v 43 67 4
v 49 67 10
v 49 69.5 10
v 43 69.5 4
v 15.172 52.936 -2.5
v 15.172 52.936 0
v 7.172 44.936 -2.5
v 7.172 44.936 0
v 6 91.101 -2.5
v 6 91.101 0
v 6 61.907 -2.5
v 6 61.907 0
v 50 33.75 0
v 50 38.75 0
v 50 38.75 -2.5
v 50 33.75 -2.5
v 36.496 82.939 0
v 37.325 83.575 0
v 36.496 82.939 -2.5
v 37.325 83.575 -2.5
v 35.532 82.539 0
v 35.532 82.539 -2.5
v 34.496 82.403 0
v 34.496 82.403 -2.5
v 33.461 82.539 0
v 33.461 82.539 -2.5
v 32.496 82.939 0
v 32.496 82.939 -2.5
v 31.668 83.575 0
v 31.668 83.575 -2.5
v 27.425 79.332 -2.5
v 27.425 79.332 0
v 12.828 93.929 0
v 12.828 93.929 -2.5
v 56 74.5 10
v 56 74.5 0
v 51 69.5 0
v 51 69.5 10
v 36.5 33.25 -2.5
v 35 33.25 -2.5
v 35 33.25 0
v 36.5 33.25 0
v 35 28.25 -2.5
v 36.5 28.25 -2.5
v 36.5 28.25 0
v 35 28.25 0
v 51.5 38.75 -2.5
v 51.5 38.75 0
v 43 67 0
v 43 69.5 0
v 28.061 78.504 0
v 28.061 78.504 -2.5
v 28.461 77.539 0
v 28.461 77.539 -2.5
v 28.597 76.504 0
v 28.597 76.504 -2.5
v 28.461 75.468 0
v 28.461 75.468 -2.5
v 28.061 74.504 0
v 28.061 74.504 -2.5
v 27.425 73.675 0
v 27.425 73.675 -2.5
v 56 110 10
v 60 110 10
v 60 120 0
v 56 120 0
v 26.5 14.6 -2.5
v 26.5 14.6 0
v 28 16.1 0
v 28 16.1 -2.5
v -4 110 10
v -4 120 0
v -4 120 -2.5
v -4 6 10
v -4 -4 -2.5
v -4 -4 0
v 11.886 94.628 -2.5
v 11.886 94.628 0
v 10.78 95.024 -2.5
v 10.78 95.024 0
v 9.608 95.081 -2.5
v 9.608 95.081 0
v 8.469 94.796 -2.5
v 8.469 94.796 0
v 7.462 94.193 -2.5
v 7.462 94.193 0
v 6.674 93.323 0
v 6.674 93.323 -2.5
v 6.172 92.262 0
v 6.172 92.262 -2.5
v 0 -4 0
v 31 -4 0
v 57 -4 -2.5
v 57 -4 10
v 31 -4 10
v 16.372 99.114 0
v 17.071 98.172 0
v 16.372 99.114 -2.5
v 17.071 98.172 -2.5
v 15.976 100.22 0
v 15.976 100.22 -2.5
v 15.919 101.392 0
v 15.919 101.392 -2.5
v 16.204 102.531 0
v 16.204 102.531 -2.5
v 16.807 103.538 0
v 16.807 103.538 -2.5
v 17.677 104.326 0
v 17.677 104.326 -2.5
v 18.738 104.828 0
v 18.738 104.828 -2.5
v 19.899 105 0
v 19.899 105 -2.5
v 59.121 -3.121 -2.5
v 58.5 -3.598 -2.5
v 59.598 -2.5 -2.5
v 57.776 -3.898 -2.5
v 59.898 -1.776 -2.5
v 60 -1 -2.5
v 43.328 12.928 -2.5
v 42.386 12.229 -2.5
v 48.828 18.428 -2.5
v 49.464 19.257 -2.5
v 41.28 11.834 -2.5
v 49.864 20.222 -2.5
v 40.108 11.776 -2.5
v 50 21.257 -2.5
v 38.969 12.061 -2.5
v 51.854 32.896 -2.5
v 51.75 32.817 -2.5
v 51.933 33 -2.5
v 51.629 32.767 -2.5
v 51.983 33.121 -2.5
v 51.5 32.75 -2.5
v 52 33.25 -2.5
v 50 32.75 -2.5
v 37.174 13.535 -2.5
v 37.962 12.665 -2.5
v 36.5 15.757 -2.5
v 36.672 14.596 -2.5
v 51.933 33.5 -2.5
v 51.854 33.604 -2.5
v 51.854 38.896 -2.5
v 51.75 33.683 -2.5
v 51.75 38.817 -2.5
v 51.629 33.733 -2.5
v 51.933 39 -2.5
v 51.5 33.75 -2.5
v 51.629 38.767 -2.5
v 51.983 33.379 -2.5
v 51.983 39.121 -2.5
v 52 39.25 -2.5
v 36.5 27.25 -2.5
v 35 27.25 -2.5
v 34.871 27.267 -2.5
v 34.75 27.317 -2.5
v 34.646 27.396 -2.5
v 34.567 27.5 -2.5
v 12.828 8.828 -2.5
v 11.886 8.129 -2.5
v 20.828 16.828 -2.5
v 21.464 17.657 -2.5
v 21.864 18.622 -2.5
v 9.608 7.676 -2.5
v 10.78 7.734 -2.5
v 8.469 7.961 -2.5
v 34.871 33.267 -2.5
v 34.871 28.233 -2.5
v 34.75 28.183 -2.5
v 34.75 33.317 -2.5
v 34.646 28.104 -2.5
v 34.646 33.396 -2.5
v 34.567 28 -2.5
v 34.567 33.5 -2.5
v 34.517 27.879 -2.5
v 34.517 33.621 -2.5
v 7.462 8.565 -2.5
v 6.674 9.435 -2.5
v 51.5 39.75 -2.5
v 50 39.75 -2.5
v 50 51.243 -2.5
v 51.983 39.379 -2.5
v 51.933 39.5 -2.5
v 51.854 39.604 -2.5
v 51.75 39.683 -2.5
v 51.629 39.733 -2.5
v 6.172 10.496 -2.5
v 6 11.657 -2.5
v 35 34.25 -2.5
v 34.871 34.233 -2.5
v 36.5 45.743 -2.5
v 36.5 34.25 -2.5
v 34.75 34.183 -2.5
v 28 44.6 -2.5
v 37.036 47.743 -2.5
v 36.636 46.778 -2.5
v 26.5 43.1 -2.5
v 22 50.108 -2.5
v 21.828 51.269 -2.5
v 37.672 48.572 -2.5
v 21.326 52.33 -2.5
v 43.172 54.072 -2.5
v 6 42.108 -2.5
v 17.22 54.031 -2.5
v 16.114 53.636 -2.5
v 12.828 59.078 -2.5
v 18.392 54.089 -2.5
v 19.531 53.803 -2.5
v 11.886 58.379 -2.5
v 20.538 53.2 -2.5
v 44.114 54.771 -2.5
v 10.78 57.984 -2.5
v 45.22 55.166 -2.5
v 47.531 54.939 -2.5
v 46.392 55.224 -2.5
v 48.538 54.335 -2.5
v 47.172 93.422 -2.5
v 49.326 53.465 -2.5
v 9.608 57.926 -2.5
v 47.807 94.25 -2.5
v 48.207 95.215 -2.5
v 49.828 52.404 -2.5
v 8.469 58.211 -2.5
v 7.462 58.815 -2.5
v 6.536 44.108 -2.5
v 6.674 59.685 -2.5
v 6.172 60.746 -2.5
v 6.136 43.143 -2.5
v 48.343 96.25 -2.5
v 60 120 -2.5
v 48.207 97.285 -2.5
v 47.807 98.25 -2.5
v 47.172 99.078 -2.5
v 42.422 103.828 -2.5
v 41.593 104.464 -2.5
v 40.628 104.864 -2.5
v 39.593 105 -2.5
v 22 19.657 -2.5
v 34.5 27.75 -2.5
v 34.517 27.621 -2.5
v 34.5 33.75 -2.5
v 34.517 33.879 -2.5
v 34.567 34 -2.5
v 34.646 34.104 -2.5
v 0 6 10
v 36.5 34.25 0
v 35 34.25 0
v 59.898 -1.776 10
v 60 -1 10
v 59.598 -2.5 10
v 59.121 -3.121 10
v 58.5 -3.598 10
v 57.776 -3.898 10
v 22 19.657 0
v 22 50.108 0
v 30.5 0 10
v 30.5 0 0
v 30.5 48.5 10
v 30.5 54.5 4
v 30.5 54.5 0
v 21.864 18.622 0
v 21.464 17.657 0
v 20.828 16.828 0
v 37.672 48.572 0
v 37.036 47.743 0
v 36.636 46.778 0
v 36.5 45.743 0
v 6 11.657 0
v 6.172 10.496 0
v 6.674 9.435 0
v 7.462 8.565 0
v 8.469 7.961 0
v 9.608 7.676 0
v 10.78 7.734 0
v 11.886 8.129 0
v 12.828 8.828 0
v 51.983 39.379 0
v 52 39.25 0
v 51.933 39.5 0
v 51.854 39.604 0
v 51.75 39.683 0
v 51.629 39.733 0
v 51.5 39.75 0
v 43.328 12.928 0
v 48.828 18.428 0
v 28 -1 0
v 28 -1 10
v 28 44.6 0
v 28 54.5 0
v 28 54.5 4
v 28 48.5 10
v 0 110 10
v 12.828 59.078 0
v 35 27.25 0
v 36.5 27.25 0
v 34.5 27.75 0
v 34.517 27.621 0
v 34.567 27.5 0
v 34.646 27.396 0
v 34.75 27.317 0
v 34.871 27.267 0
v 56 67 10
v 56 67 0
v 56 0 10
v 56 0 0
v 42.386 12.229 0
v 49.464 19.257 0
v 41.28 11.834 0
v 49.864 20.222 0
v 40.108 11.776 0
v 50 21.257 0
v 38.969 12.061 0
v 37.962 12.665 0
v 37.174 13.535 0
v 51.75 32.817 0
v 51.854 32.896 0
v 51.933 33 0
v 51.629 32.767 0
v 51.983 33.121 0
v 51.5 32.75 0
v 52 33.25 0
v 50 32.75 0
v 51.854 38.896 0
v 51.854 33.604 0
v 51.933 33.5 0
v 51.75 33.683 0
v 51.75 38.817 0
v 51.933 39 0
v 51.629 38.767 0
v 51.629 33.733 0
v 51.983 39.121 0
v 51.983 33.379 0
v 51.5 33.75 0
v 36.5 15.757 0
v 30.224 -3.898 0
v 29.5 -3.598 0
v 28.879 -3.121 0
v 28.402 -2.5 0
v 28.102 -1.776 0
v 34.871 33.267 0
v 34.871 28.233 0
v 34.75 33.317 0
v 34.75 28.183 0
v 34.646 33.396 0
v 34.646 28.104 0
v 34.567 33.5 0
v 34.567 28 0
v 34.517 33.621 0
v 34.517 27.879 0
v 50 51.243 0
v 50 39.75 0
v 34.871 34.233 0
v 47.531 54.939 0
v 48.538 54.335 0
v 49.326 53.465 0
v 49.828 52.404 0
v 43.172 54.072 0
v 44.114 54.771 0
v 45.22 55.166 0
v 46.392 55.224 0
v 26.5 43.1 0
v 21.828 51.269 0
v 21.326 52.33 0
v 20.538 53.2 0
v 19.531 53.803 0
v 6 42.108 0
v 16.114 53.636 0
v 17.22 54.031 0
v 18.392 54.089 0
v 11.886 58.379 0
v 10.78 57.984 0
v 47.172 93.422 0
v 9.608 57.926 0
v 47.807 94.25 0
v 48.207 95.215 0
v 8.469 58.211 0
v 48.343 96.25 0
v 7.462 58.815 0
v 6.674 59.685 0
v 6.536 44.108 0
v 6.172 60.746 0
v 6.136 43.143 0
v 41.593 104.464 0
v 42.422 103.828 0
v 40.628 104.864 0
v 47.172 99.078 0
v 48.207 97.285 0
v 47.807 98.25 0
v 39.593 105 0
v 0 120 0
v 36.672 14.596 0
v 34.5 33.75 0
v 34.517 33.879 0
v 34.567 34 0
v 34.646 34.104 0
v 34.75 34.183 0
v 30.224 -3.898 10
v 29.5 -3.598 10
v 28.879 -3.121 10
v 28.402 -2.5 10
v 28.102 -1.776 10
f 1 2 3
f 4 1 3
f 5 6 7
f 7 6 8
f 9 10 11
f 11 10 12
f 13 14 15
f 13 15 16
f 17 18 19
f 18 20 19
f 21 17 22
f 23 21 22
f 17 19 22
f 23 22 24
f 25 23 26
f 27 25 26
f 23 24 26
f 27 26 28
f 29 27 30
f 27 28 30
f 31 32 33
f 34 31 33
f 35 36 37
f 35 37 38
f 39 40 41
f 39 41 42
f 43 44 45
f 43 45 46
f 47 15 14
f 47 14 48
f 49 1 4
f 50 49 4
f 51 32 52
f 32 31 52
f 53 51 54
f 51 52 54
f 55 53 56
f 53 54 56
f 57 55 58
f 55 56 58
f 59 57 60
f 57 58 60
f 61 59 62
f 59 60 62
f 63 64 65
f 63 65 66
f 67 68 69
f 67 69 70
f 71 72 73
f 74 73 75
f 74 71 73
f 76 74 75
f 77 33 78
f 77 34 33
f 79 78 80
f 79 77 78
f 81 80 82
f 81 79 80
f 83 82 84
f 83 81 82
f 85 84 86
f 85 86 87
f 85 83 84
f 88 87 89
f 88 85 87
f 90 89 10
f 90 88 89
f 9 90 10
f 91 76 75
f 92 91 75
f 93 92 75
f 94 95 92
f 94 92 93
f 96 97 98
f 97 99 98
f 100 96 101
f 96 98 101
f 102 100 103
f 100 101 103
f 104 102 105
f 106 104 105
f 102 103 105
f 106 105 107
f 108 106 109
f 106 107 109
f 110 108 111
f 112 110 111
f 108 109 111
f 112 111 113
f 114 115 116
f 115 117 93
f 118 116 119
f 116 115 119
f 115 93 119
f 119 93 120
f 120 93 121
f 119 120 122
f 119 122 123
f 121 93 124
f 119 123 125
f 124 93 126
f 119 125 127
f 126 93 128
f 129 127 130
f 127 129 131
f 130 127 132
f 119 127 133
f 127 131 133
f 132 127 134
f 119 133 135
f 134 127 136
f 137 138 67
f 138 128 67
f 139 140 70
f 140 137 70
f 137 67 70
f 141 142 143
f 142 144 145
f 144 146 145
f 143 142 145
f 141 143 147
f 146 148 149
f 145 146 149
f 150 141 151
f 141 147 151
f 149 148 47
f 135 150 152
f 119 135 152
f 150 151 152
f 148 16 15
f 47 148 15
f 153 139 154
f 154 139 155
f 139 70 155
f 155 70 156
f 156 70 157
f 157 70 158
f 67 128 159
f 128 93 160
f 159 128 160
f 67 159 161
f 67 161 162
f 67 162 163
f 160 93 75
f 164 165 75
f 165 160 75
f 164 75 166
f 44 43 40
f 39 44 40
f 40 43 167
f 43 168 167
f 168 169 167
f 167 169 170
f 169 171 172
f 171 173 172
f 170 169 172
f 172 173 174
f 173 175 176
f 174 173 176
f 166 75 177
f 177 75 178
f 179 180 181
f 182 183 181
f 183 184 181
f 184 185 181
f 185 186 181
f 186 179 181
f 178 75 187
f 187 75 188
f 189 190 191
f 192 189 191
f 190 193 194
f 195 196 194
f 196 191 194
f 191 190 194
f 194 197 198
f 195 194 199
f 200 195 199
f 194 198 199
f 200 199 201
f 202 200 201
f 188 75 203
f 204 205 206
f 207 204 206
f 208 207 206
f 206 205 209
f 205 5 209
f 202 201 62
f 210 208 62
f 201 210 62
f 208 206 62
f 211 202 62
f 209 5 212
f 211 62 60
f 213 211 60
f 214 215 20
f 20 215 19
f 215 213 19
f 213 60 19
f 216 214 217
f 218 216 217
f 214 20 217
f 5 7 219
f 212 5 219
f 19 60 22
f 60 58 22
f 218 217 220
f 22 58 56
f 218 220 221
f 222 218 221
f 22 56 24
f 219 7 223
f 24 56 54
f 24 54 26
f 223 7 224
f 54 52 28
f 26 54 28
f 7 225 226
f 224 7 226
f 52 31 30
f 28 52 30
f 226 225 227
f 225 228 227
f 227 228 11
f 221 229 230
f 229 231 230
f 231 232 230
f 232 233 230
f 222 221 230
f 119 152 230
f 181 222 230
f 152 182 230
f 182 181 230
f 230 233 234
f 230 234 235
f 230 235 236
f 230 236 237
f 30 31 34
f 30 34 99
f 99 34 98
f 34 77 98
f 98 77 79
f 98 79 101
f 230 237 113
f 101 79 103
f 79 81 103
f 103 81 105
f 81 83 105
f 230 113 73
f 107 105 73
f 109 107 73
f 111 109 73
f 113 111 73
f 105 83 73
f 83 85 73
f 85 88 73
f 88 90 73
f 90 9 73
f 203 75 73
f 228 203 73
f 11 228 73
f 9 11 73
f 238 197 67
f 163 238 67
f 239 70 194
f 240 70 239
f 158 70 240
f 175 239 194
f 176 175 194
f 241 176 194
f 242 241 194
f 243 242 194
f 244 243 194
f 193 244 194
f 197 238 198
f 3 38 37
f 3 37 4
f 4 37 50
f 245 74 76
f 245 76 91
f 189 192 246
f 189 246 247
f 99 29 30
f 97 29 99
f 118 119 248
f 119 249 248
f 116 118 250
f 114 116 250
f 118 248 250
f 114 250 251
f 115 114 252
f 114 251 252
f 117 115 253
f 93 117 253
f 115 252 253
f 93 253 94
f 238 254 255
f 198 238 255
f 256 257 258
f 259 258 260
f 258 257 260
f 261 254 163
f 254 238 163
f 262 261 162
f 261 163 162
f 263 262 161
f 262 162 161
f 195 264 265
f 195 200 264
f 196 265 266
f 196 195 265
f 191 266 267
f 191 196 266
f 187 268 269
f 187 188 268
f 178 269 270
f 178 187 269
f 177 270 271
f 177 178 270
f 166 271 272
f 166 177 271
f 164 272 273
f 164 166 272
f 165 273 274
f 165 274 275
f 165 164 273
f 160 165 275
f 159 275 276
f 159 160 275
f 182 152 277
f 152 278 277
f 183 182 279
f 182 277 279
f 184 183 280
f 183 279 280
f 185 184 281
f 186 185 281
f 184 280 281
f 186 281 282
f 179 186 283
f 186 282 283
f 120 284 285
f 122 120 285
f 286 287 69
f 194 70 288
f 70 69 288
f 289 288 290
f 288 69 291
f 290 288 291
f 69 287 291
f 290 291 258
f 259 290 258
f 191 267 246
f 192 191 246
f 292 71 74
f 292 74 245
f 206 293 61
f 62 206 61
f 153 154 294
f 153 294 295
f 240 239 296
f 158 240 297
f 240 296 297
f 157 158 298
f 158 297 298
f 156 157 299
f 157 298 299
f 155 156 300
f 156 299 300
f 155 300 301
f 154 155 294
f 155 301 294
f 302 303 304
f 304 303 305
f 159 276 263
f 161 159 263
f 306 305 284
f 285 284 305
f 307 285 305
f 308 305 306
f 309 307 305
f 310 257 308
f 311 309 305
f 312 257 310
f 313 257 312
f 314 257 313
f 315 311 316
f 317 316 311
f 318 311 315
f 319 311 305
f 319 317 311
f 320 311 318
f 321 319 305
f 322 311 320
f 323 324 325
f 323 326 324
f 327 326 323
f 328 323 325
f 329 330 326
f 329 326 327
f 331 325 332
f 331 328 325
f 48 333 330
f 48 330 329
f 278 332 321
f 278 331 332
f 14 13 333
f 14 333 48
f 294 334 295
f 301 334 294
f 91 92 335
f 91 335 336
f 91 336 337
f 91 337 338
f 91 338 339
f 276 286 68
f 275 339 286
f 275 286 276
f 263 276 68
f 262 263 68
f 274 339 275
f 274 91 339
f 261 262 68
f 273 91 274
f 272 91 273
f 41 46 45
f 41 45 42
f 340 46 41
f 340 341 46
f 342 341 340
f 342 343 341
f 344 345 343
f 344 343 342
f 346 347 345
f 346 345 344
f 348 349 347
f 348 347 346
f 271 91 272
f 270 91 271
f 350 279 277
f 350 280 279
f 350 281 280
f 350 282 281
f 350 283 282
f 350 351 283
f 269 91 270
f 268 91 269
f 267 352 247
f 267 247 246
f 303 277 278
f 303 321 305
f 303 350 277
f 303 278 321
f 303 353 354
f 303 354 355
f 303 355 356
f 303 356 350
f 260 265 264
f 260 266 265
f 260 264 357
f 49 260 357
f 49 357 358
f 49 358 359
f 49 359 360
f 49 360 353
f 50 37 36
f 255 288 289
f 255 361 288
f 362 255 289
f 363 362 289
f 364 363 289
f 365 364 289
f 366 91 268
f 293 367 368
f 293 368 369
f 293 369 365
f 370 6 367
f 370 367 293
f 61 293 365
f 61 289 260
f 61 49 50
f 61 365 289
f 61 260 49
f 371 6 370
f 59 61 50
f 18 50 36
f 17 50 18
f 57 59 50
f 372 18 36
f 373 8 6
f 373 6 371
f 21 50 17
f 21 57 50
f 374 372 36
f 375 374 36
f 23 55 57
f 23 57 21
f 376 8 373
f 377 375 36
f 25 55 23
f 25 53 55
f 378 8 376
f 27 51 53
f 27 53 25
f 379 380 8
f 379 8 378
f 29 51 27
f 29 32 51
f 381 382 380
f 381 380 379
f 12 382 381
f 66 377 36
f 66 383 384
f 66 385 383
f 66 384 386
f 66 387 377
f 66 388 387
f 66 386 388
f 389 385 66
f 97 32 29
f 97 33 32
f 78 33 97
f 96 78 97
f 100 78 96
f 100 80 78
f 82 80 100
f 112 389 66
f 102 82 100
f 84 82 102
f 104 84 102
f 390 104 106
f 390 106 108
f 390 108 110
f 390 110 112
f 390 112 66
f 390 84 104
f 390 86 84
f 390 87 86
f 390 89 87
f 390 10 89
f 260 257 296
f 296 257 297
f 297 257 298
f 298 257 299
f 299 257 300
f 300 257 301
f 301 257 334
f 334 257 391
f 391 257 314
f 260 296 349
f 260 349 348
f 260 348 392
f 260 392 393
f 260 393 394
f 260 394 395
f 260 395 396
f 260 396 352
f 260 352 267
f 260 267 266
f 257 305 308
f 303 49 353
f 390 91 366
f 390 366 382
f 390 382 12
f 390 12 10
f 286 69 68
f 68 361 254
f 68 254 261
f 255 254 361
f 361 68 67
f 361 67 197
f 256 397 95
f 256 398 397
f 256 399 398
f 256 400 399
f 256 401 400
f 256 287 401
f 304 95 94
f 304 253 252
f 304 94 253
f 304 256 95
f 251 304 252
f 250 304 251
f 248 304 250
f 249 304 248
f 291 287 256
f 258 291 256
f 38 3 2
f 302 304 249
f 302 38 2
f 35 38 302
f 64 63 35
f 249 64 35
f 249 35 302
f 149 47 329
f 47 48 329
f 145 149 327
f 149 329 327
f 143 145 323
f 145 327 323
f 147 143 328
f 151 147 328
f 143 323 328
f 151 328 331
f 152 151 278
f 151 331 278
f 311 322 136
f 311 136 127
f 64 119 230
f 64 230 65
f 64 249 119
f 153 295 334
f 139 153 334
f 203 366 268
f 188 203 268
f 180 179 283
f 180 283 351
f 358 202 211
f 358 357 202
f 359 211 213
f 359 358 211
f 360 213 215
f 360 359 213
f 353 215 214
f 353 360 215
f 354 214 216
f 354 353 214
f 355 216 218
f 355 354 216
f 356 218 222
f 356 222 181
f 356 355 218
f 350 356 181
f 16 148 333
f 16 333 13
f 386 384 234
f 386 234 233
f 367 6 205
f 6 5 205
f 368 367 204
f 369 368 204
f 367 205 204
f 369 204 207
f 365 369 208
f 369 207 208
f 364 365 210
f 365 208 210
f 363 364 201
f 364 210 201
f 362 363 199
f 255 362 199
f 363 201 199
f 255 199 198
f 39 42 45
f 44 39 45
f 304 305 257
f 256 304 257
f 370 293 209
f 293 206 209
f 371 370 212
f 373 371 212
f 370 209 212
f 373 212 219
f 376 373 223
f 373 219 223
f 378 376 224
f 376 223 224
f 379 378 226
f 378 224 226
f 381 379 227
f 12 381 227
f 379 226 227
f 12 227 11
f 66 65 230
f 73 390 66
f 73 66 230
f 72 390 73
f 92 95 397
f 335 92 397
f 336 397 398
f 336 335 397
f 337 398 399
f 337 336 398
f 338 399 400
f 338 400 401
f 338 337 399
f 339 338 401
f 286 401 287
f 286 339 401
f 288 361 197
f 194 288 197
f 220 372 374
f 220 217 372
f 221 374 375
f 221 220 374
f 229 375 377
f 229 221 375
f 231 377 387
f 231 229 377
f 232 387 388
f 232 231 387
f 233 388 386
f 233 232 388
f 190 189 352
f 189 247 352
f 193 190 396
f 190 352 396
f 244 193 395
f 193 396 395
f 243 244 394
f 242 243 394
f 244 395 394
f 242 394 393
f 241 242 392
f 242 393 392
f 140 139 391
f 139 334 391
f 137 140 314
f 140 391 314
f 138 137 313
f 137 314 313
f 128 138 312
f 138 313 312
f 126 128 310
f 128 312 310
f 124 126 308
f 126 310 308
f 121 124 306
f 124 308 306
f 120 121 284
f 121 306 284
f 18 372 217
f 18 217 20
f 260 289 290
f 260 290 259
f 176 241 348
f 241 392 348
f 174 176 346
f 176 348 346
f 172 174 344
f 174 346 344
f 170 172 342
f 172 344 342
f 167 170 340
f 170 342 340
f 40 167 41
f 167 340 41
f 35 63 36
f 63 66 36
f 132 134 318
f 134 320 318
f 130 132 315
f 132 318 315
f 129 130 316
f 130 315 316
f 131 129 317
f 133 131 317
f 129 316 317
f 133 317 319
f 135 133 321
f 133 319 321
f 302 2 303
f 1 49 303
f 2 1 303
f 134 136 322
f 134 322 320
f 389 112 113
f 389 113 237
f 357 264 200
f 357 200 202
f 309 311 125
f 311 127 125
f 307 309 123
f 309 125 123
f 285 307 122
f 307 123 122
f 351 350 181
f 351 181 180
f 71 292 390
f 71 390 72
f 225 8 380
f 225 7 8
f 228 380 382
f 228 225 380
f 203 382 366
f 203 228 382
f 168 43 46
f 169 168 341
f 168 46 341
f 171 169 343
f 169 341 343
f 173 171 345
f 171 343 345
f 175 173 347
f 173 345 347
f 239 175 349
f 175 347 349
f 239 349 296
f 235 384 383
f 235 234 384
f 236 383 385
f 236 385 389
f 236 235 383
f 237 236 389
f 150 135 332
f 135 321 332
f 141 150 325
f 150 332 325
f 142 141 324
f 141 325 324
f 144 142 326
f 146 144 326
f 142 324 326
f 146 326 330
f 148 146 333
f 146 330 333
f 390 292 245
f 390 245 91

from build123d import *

# Parameters (mm, degrees)
BOSS_EXTRUDE1_DEPTH     = 10
SKETCH1_3_W             = 25.5
SKETCH1_3_H             = 67
BOSS_EXTRUDE2_DEPTH     = 2.5
CHAMFER1_SIZE           = 10
SKETCH2_W               = 15
SKETCH2_H               = 15
CUT_EXTRUDE1_DEPTH      = 10
CHAMFER2_SIZE           = 5
SKETCH3_W               = 28
SKETCH3_H               = 4
CUT_EXTRUDE2_DEPTH      = 10
FILLET2_R               = 3
FILLET3_R               = 3
CHAMFER3_SIZE           = 10
CUT_EXTRUDE3_DEPTH      = 2.5
CHAMFER4_SIZE           = 13.6
FILLET4_R               = 4
CHAMFER5_SIZE           = 6
CUT_EXTRUDE4_DEPTH      = 135.536240471
CUT_EXTRUDE4_DEPTH_BACK = 2.5
FILLET6_R               = 0.5
SKETCH7_W               = 1.5
SKETCH7_H               = 30
CUT_EXTRUDE5_DEPTH      = 2.5
CHAMFER6_SIZE           = 1.5
FILLET7_R               = 0.5


# Some blends are built 0.0001 mm under size
with BuildPart() as part:
    # Sketch1 → Boss-Extrude1 (new body)
    with BuildSketch(Plane.XY):
        Polygon((56, 67), (56, 69.5), (28, 69.5), (28, 0), (30.5, 0), (30.5, 67), align=None)
        Polygon((56, 120), (56, 69.5), (56, 67), (56, 0), (30.5, 0), (28, 0), (0, 0), (0, 120), (-4, 120), (-4, -4), (60, -4), (60, 120), align=None)
    extrude(amount=BOSS_EXTRUDE1_DEPTH)

    # Sketch1<3> → Boss-Extrude2 (add)
    with BuildSketch(Plane.XY):
        Polygon((28, 69.5), (56, 69.5), (56, 120), (0, 120), (0, 0), (28, 0), align=None)
        with Locations((43.25, 33.5)):
            Rectangle(SKETCH1_3_W, SKETCH1_3_H)
        Polygon((56, 120), (56, 69.5), (56, 67), (56, 0), (30.5, 0), (28, 0), (0, 0), (0, 120), (-4, 120), (-4, -4), (60, -4), (60, 120), align=None)
        Polygon((56, 67), (56, 69.5), (28, 69.5), (28, 0), (30.5, 0), (30.5, 67), align=None)
    extrude(amount=-BOSS_EXTRUDE2_DEPTH)

    # Chamfer1
    chamfer1_edges = [part.edges().sort_by_distance(p)[0] for p in [
        (58, 120, 10),
        (-2, 120, 10),
    ]]
    chamfer(chamfer1_edges, length=CHAMFER1_SIZE)

    # Sketch2 → Cut-Extrude1 (cut)
    with BuildSketch(Plane.XY.offset(10)):
        with Locations((35.5, 62)):
            Rectangle(SKETCH2_W, SKETCH2_H)
    extrude(amount=-CUT_EXTRUDE1_DEPTH, mode=Mode.SUBTRACT)

    # Chamfer2
    chamfer2_edges = [part.edges().sort_by_distance(p)[0] for p in [
        (56, 69.5, 5),
    ]]
    chamfer(chamfer2_edges, length=CHAMFER2_SIZE)

    # Sketch3 → Cut-Extrude2 (cut)
    with BuildSketch(Plane.XY.offset(10)):
        with Locations((14, -2)):
            Rectangle(SKETCH3_W, SKETCH3_H)
    extrude(amount=-CUT_EXTRUDE2_DEPTH, mode=Mode.SUBTRACT)

    # Fillet2
    fillet2_edges = [part.edges().sort_by_distance(p)[0] for p in [
        (28, -4, 5),
    ]]
    fillet(fillet2_edges, radius=FILLET2_R)

    # Fillet3
    fillet3_edges = [part.edges().sort_by_distance(p)[0] for p in [
        (60, -4, 3.75),
    ]]
    fillet(fillet3_edges, radius=FILLET3_R)

    # Chamfer3
    chamfer3_edges = [part.edges().sort_by_distance(p)[0] for p in [
        (-2, -4, 10),
    ]]
    chamfer(chamfer3_edges, length=CHAMFER3_SIZE)

    # Sketch4 → Cut-Extrude3 (cut)
    with BuildSketch(Plane.XY):
        Polygon((36.5, 60.5), (36.5, 61), (37, 61), (50, 61), (50, 6), (36.5, 6), align=None)
        Polygon((10.242640687, 105), (41.25, 105), (50, 96.25), (34.496320344, 80.746320344), align=None)
        Polygon((22, 68.25), (30.253679656, 76.503679656), (6, 100.757359313), (6, 52.25), align=None)
        Polygon((22, 59.764718626), (10.242640687, 48.007359313), (6, 43.764718626), (6, 2), (22, 18), align=None)
    extrude(amount=-CUT_EXTRUDE3_DEPTH, mode=Mode.SUBTRACT)

    # Chamfer4
    # the kernel refuses this chamfer: 13.6 mm, written as the material it adds along each edge
    with BuildSketch(Plane(origin=(50, 6, 0), x_dir=(-0.9996219169112968, -0.0274958766105864, 0), z_dir=(0, 0, -1))) as chamfer4_piece_1:
        Polygon((CHAMFER4_SIZE * 0.999621916911, CHAMFER4_SIZE * 0.0274958766106), (-CHAMFER4_SIZE * 0.0274958766106, CHAMFER4_SIZE * 0.999621916911), (0, 0), align=None)
    extrude(amount=2.5)
    with BuildSketch(Plane(origin=(36.5, 61, 0), x_dir=(-0.027495876610586337, -0.9996219169112968, 0), z_dir=(0, 0, -1))) as chamfer4_piece_2:
        Polygon((CHAMFER4_SIZE * 0.999621916911, -CHAMFER4_SIZE * 0.0274958766106), (-CHAMFER4_SIZE * 0.0274958766106, -CHAMFER4_SIZE * 0.999621916911), (0, 0), align=None)
    extrude(amount=2.5)

    # Fillet4
    fillet4_edges = [part.edges().sort_by_distance(p)[0] for p in [
        (22, 18, -1.25),
        (6, 2, -1.25),
        (6, 43.764718626, -1.25),
        (22, 59.764718626, -1.25),
        (6, 52.25, -1.25),
        (6, 100.757359313, -1.25),
        (30.253679656, 76.503679656, -1.25),
        (41.25, 105, -1.25),
        (50, 96.25, -1.25),
        (34.496320344, 80.746320344, -1.25),
        (10.242640687, 105, -1.25),
        (50, 60.9, -1.25),
        (50, 19.6, -1.25),
        (36.5, 47.4, -1.25),
        (36.5, 6.1, -1.25),
    ]]
    fillet(fillet4_edges, radius=FILLET4_R)

    # Chamfer5
    chamfer5_edges = [part.edges().sort_by_distance(p)[0] for p in [
        (29.25, 54.5, 10),
        (43, 68.25, 10),
    ]]
    chamfer(chamfer5_edges, length=CHAMFER5_SIZE)

    # Sketch6 → Cut-Extrude4 (cut, two sides: drawn at the far end of the back side and taken through both)
    with BuildSketch(Plane.XY.offset(-CUT_EXTRUDE4_DEPTH_BACK)):
        Polygon((34.5, 33.25), (36.5, 33.25), (36.5, 33.75), (36.5, 34.25), (34.5, 34.25), align=None)
        Polygon((36.5, 27.25), (36.5, 27.75), (36.5, 28.25), (34.5, 28.25), (34.5, 27.25), align=None)
        Polygon((50, 33.75), (50, 33.25), (50, 32.75), (52, 32.75), (52, 33.75), align=None)
        Polygon((50, 39.25), (50, 38.75), (52, 38.75), (52, 39.75), (50, 39.75), align=None)
    extrude(amount=CUT_EXTRUDE4_DEPTH + CUT_EXTRUDE4_DEPTH_BACK, mode=Mode.SUBTRACT)

    # Fillet6
    fillet6_edges = [part.edges().sort_by_distance(p)[0] for p in [
        (52, 38.75, -1.25),
        (52, 39.75, -1.25),
        (34.5, 27.25, -1.25),
        (34.5, 28.25, -1.25),
        (34.5, 33.25, -1.25),
        (34.5, 34.25, -1.25),
    ]]
    fillet(fillet6_edges, radius=FILLET6_R - 0.0001)  # a hair under: the kernel refuses the full size

    # Sketch7 → Cut-Extrude5 (cut)
    with BuildSketch(Plane.XY):
        with Locations((27.25, 29.600220455)):
            Rectangle(SKETCH7_W, SKETCH7_H)
    extrude(amount=-CUT_EXTRUDE5_DEPTH, mode=Mode.SUBTRACT)

    # Chamfer6
    chamfer6_edges = [part.edges().sort_by_distance(p)[0] for p in [
        (28, 14.600220455, -1.25),
        (26.5, 44.600220455, -1.25),
    ]]
    chamfer(chamfer6_edges, length=CHAMFER6_SIZE - 0.0001)  # a hair under: the kernel refuses the full size

    # Fillet7
    fillet7_edges = [part.edges().sort_by_distance(p)[0] for p in [
        (52, 32.75, -1.25),
        (52, 33.75, -1.25),
    ]]
    fillet(fillet7_edges, radius=FILLET7_R - 0.0001)  # a hair under: the kernel refuses the full size


solid = part.part
